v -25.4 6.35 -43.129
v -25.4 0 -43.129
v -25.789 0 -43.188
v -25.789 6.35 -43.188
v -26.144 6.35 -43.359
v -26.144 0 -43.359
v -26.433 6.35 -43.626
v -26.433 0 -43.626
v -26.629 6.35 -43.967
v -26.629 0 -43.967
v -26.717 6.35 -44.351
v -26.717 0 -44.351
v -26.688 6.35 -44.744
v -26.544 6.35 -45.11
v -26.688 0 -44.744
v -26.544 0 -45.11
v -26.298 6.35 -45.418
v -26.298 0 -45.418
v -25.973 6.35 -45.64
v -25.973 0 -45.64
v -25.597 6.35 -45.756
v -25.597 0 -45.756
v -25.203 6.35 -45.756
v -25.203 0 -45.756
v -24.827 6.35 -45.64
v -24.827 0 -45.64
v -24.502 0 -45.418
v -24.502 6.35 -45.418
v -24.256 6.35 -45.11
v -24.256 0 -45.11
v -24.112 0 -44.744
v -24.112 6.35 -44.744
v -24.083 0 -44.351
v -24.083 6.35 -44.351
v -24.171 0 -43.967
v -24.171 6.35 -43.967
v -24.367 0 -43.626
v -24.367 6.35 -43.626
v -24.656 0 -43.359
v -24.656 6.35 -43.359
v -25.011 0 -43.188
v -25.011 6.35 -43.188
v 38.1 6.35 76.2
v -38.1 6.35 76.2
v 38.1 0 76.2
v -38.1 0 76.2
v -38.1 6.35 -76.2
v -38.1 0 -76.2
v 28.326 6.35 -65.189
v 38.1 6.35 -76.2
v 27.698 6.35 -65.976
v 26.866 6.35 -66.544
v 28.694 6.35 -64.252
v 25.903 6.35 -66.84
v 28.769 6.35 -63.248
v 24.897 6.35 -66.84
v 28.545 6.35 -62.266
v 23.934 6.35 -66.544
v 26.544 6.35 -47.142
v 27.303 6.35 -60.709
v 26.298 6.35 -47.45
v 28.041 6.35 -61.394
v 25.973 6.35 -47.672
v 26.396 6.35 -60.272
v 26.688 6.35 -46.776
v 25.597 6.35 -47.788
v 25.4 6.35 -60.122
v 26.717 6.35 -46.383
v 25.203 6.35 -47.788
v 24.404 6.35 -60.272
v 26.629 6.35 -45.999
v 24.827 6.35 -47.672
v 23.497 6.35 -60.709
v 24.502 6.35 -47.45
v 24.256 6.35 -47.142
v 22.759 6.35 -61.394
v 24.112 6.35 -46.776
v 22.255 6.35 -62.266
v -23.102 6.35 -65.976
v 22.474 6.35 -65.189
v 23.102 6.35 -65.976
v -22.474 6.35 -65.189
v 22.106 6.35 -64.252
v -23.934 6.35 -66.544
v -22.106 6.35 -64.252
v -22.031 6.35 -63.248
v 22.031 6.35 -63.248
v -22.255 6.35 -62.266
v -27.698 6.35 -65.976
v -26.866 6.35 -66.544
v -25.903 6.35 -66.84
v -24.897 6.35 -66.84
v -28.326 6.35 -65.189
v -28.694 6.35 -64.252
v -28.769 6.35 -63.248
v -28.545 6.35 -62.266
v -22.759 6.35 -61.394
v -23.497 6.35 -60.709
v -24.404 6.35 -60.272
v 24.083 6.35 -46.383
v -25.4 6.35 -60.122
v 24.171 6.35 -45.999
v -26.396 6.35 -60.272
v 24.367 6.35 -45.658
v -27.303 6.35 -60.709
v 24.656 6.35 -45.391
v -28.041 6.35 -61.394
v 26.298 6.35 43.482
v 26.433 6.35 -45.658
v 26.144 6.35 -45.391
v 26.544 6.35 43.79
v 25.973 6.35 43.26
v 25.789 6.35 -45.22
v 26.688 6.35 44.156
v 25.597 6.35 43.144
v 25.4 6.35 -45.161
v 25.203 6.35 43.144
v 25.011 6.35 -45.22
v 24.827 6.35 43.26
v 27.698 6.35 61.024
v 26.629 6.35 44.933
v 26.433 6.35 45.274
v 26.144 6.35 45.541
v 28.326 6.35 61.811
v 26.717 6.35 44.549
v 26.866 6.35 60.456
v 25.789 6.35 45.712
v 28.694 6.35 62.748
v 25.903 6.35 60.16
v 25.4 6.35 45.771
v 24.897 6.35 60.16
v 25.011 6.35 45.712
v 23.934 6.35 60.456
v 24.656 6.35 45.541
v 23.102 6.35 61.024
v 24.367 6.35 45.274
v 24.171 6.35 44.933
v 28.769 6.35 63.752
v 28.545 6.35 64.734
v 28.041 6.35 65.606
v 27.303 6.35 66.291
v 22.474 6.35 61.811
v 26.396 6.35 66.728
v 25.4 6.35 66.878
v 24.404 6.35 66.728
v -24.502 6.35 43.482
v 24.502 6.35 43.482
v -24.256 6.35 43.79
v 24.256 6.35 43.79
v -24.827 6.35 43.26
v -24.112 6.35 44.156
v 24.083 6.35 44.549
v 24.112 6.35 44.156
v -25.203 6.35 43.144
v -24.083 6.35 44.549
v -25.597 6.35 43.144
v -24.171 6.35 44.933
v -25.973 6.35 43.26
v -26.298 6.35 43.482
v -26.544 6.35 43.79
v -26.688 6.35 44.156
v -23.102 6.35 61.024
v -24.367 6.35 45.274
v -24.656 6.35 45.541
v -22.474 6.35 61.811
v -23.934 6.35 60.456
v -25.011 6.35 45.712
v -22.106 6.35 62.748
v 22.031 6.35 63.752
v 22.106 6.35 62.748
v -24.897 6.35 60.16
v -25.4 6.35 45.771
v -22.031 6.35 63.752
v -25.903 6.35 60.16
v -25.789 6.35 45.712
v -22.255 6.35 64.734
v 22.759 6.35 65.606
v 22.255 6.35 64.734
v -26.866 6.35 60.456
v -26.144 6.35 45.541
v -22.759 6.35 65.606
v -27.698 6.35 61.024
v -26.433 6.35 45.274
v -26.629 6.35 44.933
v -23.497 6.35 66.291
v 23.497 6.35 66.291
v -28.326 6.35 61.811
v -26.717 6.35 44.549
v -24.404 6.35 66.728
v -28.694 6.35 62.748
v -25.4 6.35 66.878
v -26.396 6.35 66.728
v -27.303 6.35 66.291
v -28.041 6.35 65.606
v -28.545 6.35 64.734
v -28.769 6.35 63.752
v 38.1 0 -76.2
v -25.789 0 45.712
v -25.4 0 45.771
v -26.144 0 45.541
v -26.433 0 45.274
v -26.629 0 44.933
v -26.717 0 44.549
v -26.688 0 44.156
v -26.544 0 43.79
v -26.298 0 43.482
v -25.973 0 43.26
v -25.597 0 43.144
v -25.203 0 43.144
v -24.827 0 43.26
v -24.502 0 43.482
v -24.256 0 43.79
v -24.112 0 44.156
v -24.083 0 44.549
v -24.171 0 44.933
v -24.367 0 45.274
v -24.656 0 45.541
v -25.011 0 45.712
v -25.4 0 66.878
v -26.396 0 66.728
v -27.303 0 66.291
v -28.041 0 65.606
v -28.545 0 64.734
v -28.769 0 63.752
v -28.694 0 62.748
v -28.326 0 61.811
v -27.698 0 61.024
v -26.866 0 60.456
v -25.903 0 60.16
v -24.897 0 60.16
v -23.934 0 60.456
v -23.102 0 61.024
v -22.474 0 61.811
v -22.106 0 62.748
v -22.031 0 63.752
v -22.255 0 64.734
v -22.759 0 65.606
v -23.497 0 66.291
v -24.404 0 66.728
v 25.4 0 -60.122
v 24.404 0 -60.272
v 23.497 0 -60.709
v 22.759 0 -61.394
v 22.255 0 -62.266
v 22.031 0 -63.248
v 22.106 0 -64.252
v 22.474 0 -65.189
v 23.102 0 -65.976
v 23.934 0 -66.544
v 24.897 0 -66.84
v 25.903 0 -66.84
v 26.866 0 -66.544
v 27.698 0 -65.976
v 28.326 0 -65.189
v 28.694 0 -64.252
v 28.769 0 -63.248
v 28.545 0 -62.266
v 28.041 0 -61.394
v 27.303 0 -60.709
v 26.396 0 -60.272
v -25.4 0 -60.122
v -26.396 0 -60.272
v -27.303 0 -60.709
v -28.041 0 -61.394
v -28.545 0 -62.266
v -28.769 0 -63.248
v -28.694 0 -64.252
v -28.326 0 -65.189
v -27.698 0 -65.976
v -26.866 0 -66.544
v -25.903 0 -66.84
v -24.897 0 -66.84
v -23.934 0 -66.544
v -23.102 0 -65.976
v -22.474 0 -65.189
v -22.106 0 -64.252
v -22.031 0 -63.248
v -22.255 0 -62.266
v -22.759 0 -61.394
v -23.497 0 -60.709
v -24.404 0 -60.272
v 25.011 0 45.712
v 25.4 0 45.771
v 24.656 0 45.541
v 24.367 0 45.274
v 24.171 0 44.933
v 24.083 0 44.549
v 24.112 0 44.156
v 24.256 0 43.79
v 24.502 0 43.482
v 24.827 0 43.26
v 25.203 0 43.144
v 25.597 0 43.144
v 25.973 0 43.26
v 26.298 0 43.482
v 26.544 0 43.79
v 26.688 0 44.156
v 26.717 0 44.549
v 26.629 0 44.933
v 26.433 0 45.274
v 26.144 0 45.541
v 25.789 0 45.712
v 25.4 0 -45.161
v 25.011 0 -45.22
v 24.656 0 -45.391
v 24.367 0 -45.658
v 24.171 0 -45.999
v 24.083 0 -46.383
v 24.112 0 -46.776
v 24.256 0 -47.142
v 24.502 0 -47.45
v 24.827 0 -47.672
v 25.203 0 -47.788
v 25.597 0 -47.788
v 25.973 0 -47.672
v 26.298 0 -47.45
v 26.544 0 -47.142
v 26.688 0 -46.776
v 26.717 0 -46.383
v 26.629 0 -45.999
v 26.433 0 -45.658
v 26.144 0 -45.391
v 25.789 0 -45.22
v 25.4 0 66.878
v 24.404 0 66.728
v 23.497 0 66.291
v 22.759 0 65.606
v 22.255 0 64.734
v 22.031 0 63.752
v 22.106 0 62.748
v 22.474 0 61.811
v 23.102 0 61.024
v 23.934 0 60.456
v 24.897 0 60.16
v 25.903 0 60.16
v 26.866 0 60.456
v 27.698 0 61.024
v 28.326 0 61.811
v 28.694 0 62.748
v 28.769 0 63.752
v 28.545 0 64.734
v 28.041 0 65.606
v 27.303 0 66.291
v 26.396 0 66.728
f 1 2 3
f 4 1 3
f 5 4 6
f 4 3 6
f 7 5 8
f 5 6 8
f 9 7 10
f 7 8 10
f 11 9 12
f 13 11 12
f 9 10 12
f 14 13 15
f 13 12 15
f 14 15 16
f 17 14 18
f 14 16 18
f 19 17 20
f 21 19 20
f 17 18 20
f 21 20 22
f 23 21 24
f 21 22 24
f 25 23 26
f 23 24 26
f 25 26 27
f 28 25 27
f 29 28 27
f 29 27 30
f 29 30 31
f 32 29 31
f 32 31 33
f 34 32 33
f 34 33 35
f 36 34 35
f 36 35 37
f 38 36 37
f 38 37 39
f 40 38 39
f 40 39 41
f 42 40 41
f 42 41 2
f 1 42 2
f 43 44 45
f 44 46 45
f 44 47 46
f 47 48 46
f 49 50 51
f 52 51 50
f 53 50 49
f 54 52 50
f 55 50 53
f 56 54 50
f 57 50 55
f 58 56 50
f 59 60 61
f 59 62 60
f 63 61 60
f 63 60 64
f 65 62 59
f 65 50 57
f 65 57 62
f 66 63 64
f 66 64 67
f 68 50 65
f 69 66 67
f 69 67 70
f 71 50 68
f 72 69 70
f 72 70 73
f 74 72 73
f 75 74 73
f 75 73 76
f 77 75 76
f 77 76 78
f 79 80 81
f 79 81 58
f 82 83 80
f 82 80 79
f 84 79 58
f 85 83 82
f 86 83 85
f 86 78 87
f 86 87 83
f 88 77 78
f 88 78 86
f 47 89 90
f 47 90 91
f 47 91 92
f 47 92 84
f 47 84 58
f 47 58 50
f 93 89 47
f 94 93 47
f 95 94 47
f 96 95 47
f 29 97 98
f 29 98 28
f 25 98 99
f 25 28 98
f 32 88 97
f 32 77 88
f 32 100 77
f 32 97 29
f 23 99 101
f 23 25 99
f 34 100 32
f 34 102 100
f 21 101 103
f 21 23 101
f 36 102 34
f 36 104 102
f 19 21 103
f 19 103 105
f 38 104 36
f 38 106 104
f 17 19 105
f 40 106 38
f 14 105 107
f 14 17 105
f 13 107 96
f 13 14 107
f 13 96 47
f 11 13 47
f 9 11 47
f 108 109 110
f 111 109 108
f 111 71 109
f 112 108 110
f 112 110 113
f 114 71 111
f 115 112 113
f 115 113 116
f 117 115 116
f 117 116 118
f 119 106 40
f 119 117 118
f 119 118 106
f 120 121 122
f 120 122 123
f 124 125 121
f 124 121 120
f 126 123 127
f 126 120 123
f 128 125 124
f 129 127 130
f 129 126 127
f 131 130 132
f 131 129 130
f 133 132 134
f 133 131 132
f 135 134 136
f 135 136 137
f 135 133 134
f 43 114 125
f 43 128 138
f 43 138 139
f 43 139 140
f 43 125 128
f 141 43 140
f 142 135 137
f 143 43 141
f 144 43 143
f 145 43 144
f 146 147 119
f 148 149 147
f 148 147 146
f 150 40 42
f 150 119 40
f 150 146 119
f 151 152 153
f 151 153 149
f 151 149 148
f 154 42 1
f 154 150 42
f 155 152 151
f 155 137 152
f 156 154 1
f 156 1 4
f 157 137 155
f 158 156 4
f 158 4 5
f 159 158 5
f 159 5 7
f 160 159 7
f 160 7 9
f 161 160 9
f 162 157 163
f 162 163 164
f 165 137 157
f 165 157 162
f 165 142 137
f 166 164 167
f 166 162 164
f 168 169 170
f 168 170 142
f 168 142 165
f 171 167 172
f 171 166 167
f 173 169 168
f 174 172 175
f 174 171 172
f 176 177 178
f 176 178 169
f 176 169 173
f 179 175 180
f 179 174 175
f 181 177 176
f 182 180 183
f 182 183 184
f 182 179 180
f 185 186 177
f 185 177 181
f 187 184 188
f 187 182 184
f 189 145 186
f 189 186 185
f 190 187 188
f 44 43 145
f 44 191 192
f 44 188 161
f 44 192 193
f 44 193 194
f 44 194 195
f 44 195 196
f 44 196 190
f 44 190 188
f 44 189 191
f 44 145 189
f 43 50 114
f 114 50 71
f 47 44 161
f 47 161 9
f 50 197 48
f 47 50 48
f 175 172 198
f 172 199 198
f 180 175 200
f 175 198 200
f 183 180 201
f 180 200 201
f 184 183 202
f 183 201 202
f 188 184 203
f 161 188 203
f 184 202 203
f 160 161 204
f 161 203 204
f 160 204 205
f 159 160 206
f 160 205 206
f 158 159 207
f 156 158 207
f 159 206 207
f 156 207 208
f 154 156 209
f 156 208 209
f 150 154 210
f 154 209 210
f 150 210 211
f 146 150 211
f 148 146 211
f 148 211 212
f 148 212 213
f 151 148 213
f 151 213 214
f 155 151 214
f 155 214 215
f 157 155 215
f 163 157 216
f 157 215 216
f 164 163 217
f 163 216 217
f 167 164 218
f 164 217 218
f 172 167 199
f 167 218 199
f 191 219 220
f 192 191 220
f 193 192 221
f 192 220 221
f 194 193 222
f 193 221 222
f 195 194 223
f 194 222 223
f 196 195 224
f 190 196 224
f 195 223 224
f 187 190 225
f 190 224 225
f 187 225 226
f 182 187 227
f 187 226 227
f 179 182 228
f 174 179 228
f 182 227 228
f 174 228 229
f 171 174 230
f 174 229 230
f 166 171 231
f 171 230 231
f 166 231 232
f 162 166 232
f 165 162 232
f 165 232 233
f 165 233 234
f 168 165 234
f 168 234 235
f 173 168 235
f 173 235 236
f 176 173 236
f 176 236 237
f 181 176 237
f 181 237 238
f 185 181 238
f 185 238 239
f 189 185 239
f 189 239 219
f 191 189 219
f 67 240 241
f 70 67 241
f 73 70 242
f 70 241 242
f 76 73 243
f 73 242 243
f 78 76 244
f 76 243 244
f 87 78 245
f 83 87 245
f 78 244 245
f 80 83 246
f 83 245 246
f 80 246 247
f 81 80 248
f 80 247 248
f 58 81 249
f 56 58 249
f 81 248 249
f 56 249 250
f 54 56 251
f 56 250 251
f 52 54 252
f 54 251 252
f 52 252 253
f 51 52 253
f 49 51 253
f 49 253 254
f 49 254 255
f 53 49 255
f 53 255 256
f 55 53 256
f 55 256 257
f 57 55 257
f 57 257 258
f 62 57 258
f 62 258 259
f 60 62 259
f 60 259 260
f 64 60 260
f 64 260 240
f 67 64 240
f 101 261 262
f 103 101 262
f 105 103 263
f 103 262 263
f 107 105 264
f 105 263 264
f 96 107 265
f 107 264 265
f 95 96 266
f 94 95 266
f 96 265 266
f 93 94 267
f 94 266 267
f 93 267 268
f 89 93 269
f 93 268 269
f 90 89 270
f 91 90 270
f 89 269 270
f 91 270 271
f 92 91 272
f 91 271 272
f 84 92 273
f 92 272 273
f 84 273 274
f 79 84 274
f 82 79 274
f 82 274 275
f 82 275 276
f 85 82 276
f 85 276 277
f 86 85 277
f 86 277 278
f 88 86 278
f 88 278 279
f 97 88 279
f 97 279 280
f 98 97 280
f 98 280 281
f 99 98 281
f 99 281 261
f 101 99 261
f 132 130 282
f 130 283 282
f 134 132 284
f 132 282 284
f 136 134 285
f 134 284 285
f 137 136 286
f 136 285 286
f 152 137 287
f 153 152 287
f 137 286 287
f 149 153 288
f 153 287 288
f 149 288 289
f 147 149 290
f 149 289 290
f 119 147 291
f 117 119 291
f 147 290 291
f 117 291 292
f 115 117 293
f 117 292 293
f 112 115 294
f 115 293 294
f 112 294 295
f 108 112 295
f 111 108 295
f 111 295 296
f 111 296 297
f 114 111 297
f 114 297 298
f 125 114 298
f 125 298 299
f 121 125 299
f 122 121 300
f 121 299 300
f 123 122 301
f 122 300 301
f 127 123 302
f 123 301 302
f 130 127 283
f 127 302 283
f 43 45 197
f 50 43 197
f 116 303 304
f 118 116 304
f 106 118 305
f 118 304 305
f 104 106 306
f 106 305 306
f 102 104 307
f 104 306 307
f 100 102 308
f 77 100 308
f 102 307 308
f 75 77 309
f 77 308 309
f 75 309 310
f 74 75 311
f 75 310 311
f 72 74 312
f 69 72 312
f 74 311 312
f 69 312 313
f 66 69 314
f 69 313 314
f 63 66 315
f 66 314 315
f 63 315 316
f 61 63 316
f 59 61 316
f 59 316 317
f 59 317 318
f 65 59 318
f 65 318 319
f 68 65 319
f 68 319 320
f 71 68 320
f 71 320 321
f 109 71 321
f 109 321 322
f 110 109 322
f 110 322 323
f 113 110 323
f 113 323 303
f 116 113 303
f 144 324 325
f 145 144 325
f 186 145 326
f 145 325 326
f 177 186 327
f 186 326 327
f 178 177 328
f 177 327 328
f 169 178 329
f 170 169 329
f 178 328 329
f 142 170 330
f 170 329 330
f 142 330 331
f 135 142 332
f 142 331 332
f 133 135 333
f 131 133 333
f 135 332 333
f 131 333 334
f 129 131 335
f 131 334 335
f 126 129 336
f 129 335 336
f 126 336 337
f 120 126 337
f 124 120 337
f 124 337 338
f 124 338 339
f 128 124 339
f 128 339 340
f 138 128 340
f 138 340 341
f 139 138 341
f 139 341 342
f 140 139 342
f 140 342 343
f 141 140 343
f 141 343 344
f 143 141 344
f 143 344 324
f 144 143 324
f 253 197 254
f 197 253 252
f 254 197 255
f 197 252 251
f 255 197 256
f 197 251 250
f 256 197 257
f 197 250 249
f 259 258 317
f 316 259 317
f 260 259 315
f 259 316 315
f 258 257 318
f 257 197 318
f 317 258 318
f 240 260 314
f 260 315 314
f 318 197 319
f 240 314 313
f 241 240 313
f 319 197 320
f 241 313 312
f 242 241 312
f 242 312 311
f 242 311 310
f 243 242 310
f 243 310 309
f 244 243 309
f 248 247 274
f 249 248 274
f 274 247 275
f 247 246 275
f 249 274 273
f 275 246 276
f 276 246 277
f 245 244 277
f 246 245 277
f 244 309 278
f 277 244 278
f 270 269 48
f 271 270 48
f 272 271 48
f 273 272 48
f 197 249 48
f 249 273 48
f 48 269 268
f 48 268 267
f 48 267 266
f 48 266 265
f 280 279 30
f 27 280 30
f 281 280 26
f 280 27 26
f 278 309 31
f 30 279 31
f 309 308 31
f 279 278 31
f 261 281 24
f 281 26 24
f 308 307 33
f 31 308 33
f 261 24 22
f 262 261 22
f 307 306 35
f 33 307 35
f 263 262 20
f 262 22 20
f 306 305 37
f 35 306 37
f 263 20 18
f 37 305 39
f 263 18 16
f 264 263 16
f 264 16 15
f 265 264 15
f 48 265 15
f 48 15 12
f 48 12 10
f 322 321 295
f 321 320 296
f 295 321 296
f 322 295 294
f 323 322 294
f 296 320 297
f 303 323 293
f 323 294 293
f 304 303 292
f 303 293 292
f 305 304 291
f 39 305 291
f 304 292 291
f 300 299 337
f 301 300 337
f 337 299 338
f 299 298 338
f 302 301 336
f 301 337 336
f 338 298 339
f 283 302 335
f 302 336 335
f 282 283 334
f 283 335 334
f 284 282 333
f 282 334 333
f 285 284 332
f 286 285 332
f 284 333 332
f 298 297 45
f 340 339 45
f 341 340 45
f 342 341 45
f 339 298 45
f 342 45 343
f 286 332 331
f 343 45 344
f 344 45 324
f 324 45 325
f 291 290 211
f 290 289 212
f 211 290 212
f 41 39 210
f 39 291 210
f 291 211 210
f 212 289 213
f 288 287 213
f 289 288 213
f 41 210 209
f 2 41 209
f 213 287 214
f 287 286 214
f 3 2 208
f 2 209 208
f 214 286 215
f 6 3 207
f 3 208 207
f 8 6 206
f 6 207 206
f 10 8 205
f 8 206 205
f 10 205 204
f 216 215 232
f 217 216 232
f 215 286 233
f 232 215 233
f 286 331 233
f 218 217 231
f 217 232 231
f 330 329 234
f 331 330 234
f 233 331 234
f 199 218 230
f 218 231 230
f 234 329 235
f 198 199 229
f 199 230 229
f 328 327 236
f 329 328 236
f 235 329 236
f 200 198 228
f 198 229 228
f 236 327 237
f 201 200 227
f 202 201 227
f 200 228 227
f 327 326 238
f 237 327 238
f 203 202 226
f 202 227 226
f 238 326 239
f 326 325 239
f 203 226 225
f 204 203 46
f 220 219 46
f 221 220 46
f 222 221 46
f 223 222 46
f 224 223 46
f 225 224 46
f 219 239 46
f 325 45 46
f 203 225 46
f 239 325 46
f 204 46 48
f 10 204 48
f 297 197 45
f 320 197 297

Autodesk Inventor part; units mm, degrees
ref_plane "YZ Plane" through (0, 0, 0) normal (1, 0, 0) x (0, 1, 0)
ref_plane "XZ Plane" through (0, 0, 0) normal (0, 1, 0) x (-1, 0, 0)
ref_plane "XY Plane" through (0, 0, 0) normal (0, 0, 1) x (1, 0, 0)
sketch "Sketch1" plane through (0, 0, 0) normal (0, 1, 0) x (-1, 0, 0)
  line L0 (38.1, 76.2) -> (-38.1, 76.2)
  line L1 (-38.1, 76.2) -> (-38.1, -76.2)
  line L2 (-38.1, -76.2) -> (38.1, -76.2)
  line L3 (38.1, -76.2) -> (38.1, 76.2)
  line L4 (38.1, 76.2) -> (-38.1, -76.2) construction
  line L5 (-38.1, 76.2) -> (38.1, -76.2) construction
  point P0 (0, 0)
  dimension "d0" = 76.2
  dimension "d1" = 152.4
extrude "Extrusion1" add sketch "Sketch1" along normal blind 6.35
sketch "Sketch2" plane through (0, 6.35, 0) normal (0, 1, 0) x (1, 0, 0)
  line L0 (38.1, 76.2) -> (-38.1, 76.2) projected
  line L1 (-38.1, 76.2) -> (-38.1, -76.2) projected
  line L2 (38.1, -76.2) -> (38.1, 76.2) projected
  line L3 (-38.1, -76.2) -> (38.1, -76.2) projected
  point P0 (0, 0)
  point P1 (-25.4, 63.5)
  point P2 (25.4, 63.5)
  point P3 (25.4, -63.5)
  point P4 (-25.4, -63.5)
  dimension "d11" = 12.7
  dimension "d12" = 12.7
  dimension "d13" = 12.7
  dimension "d14" = 12.7
  dimension "d15" = 12.7
  dimension "d16" = 12.7
  dimension "d17" = 12.7
  dimension "d18" = 12.7
hole "Hole1" at (-25.4, 6.35, -63.5) at (25.4, 6.35, -63.5) at (25.4, 6.35, 63.5) at (-25.4, 6.35, 63.5) direction (0, -1, 0) diameter 6.7564 depth 10.8 tip angle 118 clearance for "Socket Head Cap Screw" size "1/4" standard "Ansi Unified Screw Threads"
sketch "Sketch3" plane through (0, 6.35, 0) normal (0, 1, 0) x (1, 0, 0)
  line L0 (-38.1, -76.2) -> (38.1, -76.2) projected
  line L1 (-38.1, 76.2) -> (-38.1, -76.2) projected
  line L2 (38.1, -76.2) -> (38.1, 76.2) projected
  line L3 (38.1, 76.2) -> (-38.1, 76.2) projected
  point P0 (0, 0)
  point P1 (-25.4, 44.45)
  point P2 (-25.4, -44.45)
  point P3 (25.4, -44.45)
  point P4 (25.4, 46.482)
  dimension "d26" = 31.75
  dimension "d27" = 12.7
  dimension "d28" = 31.75
  dimension "d29" = 12.7
  dimension "d30" = 12.7
  dimension "d32" = 31.75
  dimension "d33" = 12.7
  dimension "d34" = 90.932
hole "Hole2" at (-25.4, 6.35, -44.45) at (-25.4, 6.35, 44.45) at (25.4, 6.35, 44.45) at (25.4, 6.35, -46.482) direction (0, -1, 0) diameter 2.6416 depth 10.9728 tip angle 118 thread size "6-32 UNC" class "2B" standard "ANSI Unified Screw Threads"
properties part number "GalvoBoardPlate"
